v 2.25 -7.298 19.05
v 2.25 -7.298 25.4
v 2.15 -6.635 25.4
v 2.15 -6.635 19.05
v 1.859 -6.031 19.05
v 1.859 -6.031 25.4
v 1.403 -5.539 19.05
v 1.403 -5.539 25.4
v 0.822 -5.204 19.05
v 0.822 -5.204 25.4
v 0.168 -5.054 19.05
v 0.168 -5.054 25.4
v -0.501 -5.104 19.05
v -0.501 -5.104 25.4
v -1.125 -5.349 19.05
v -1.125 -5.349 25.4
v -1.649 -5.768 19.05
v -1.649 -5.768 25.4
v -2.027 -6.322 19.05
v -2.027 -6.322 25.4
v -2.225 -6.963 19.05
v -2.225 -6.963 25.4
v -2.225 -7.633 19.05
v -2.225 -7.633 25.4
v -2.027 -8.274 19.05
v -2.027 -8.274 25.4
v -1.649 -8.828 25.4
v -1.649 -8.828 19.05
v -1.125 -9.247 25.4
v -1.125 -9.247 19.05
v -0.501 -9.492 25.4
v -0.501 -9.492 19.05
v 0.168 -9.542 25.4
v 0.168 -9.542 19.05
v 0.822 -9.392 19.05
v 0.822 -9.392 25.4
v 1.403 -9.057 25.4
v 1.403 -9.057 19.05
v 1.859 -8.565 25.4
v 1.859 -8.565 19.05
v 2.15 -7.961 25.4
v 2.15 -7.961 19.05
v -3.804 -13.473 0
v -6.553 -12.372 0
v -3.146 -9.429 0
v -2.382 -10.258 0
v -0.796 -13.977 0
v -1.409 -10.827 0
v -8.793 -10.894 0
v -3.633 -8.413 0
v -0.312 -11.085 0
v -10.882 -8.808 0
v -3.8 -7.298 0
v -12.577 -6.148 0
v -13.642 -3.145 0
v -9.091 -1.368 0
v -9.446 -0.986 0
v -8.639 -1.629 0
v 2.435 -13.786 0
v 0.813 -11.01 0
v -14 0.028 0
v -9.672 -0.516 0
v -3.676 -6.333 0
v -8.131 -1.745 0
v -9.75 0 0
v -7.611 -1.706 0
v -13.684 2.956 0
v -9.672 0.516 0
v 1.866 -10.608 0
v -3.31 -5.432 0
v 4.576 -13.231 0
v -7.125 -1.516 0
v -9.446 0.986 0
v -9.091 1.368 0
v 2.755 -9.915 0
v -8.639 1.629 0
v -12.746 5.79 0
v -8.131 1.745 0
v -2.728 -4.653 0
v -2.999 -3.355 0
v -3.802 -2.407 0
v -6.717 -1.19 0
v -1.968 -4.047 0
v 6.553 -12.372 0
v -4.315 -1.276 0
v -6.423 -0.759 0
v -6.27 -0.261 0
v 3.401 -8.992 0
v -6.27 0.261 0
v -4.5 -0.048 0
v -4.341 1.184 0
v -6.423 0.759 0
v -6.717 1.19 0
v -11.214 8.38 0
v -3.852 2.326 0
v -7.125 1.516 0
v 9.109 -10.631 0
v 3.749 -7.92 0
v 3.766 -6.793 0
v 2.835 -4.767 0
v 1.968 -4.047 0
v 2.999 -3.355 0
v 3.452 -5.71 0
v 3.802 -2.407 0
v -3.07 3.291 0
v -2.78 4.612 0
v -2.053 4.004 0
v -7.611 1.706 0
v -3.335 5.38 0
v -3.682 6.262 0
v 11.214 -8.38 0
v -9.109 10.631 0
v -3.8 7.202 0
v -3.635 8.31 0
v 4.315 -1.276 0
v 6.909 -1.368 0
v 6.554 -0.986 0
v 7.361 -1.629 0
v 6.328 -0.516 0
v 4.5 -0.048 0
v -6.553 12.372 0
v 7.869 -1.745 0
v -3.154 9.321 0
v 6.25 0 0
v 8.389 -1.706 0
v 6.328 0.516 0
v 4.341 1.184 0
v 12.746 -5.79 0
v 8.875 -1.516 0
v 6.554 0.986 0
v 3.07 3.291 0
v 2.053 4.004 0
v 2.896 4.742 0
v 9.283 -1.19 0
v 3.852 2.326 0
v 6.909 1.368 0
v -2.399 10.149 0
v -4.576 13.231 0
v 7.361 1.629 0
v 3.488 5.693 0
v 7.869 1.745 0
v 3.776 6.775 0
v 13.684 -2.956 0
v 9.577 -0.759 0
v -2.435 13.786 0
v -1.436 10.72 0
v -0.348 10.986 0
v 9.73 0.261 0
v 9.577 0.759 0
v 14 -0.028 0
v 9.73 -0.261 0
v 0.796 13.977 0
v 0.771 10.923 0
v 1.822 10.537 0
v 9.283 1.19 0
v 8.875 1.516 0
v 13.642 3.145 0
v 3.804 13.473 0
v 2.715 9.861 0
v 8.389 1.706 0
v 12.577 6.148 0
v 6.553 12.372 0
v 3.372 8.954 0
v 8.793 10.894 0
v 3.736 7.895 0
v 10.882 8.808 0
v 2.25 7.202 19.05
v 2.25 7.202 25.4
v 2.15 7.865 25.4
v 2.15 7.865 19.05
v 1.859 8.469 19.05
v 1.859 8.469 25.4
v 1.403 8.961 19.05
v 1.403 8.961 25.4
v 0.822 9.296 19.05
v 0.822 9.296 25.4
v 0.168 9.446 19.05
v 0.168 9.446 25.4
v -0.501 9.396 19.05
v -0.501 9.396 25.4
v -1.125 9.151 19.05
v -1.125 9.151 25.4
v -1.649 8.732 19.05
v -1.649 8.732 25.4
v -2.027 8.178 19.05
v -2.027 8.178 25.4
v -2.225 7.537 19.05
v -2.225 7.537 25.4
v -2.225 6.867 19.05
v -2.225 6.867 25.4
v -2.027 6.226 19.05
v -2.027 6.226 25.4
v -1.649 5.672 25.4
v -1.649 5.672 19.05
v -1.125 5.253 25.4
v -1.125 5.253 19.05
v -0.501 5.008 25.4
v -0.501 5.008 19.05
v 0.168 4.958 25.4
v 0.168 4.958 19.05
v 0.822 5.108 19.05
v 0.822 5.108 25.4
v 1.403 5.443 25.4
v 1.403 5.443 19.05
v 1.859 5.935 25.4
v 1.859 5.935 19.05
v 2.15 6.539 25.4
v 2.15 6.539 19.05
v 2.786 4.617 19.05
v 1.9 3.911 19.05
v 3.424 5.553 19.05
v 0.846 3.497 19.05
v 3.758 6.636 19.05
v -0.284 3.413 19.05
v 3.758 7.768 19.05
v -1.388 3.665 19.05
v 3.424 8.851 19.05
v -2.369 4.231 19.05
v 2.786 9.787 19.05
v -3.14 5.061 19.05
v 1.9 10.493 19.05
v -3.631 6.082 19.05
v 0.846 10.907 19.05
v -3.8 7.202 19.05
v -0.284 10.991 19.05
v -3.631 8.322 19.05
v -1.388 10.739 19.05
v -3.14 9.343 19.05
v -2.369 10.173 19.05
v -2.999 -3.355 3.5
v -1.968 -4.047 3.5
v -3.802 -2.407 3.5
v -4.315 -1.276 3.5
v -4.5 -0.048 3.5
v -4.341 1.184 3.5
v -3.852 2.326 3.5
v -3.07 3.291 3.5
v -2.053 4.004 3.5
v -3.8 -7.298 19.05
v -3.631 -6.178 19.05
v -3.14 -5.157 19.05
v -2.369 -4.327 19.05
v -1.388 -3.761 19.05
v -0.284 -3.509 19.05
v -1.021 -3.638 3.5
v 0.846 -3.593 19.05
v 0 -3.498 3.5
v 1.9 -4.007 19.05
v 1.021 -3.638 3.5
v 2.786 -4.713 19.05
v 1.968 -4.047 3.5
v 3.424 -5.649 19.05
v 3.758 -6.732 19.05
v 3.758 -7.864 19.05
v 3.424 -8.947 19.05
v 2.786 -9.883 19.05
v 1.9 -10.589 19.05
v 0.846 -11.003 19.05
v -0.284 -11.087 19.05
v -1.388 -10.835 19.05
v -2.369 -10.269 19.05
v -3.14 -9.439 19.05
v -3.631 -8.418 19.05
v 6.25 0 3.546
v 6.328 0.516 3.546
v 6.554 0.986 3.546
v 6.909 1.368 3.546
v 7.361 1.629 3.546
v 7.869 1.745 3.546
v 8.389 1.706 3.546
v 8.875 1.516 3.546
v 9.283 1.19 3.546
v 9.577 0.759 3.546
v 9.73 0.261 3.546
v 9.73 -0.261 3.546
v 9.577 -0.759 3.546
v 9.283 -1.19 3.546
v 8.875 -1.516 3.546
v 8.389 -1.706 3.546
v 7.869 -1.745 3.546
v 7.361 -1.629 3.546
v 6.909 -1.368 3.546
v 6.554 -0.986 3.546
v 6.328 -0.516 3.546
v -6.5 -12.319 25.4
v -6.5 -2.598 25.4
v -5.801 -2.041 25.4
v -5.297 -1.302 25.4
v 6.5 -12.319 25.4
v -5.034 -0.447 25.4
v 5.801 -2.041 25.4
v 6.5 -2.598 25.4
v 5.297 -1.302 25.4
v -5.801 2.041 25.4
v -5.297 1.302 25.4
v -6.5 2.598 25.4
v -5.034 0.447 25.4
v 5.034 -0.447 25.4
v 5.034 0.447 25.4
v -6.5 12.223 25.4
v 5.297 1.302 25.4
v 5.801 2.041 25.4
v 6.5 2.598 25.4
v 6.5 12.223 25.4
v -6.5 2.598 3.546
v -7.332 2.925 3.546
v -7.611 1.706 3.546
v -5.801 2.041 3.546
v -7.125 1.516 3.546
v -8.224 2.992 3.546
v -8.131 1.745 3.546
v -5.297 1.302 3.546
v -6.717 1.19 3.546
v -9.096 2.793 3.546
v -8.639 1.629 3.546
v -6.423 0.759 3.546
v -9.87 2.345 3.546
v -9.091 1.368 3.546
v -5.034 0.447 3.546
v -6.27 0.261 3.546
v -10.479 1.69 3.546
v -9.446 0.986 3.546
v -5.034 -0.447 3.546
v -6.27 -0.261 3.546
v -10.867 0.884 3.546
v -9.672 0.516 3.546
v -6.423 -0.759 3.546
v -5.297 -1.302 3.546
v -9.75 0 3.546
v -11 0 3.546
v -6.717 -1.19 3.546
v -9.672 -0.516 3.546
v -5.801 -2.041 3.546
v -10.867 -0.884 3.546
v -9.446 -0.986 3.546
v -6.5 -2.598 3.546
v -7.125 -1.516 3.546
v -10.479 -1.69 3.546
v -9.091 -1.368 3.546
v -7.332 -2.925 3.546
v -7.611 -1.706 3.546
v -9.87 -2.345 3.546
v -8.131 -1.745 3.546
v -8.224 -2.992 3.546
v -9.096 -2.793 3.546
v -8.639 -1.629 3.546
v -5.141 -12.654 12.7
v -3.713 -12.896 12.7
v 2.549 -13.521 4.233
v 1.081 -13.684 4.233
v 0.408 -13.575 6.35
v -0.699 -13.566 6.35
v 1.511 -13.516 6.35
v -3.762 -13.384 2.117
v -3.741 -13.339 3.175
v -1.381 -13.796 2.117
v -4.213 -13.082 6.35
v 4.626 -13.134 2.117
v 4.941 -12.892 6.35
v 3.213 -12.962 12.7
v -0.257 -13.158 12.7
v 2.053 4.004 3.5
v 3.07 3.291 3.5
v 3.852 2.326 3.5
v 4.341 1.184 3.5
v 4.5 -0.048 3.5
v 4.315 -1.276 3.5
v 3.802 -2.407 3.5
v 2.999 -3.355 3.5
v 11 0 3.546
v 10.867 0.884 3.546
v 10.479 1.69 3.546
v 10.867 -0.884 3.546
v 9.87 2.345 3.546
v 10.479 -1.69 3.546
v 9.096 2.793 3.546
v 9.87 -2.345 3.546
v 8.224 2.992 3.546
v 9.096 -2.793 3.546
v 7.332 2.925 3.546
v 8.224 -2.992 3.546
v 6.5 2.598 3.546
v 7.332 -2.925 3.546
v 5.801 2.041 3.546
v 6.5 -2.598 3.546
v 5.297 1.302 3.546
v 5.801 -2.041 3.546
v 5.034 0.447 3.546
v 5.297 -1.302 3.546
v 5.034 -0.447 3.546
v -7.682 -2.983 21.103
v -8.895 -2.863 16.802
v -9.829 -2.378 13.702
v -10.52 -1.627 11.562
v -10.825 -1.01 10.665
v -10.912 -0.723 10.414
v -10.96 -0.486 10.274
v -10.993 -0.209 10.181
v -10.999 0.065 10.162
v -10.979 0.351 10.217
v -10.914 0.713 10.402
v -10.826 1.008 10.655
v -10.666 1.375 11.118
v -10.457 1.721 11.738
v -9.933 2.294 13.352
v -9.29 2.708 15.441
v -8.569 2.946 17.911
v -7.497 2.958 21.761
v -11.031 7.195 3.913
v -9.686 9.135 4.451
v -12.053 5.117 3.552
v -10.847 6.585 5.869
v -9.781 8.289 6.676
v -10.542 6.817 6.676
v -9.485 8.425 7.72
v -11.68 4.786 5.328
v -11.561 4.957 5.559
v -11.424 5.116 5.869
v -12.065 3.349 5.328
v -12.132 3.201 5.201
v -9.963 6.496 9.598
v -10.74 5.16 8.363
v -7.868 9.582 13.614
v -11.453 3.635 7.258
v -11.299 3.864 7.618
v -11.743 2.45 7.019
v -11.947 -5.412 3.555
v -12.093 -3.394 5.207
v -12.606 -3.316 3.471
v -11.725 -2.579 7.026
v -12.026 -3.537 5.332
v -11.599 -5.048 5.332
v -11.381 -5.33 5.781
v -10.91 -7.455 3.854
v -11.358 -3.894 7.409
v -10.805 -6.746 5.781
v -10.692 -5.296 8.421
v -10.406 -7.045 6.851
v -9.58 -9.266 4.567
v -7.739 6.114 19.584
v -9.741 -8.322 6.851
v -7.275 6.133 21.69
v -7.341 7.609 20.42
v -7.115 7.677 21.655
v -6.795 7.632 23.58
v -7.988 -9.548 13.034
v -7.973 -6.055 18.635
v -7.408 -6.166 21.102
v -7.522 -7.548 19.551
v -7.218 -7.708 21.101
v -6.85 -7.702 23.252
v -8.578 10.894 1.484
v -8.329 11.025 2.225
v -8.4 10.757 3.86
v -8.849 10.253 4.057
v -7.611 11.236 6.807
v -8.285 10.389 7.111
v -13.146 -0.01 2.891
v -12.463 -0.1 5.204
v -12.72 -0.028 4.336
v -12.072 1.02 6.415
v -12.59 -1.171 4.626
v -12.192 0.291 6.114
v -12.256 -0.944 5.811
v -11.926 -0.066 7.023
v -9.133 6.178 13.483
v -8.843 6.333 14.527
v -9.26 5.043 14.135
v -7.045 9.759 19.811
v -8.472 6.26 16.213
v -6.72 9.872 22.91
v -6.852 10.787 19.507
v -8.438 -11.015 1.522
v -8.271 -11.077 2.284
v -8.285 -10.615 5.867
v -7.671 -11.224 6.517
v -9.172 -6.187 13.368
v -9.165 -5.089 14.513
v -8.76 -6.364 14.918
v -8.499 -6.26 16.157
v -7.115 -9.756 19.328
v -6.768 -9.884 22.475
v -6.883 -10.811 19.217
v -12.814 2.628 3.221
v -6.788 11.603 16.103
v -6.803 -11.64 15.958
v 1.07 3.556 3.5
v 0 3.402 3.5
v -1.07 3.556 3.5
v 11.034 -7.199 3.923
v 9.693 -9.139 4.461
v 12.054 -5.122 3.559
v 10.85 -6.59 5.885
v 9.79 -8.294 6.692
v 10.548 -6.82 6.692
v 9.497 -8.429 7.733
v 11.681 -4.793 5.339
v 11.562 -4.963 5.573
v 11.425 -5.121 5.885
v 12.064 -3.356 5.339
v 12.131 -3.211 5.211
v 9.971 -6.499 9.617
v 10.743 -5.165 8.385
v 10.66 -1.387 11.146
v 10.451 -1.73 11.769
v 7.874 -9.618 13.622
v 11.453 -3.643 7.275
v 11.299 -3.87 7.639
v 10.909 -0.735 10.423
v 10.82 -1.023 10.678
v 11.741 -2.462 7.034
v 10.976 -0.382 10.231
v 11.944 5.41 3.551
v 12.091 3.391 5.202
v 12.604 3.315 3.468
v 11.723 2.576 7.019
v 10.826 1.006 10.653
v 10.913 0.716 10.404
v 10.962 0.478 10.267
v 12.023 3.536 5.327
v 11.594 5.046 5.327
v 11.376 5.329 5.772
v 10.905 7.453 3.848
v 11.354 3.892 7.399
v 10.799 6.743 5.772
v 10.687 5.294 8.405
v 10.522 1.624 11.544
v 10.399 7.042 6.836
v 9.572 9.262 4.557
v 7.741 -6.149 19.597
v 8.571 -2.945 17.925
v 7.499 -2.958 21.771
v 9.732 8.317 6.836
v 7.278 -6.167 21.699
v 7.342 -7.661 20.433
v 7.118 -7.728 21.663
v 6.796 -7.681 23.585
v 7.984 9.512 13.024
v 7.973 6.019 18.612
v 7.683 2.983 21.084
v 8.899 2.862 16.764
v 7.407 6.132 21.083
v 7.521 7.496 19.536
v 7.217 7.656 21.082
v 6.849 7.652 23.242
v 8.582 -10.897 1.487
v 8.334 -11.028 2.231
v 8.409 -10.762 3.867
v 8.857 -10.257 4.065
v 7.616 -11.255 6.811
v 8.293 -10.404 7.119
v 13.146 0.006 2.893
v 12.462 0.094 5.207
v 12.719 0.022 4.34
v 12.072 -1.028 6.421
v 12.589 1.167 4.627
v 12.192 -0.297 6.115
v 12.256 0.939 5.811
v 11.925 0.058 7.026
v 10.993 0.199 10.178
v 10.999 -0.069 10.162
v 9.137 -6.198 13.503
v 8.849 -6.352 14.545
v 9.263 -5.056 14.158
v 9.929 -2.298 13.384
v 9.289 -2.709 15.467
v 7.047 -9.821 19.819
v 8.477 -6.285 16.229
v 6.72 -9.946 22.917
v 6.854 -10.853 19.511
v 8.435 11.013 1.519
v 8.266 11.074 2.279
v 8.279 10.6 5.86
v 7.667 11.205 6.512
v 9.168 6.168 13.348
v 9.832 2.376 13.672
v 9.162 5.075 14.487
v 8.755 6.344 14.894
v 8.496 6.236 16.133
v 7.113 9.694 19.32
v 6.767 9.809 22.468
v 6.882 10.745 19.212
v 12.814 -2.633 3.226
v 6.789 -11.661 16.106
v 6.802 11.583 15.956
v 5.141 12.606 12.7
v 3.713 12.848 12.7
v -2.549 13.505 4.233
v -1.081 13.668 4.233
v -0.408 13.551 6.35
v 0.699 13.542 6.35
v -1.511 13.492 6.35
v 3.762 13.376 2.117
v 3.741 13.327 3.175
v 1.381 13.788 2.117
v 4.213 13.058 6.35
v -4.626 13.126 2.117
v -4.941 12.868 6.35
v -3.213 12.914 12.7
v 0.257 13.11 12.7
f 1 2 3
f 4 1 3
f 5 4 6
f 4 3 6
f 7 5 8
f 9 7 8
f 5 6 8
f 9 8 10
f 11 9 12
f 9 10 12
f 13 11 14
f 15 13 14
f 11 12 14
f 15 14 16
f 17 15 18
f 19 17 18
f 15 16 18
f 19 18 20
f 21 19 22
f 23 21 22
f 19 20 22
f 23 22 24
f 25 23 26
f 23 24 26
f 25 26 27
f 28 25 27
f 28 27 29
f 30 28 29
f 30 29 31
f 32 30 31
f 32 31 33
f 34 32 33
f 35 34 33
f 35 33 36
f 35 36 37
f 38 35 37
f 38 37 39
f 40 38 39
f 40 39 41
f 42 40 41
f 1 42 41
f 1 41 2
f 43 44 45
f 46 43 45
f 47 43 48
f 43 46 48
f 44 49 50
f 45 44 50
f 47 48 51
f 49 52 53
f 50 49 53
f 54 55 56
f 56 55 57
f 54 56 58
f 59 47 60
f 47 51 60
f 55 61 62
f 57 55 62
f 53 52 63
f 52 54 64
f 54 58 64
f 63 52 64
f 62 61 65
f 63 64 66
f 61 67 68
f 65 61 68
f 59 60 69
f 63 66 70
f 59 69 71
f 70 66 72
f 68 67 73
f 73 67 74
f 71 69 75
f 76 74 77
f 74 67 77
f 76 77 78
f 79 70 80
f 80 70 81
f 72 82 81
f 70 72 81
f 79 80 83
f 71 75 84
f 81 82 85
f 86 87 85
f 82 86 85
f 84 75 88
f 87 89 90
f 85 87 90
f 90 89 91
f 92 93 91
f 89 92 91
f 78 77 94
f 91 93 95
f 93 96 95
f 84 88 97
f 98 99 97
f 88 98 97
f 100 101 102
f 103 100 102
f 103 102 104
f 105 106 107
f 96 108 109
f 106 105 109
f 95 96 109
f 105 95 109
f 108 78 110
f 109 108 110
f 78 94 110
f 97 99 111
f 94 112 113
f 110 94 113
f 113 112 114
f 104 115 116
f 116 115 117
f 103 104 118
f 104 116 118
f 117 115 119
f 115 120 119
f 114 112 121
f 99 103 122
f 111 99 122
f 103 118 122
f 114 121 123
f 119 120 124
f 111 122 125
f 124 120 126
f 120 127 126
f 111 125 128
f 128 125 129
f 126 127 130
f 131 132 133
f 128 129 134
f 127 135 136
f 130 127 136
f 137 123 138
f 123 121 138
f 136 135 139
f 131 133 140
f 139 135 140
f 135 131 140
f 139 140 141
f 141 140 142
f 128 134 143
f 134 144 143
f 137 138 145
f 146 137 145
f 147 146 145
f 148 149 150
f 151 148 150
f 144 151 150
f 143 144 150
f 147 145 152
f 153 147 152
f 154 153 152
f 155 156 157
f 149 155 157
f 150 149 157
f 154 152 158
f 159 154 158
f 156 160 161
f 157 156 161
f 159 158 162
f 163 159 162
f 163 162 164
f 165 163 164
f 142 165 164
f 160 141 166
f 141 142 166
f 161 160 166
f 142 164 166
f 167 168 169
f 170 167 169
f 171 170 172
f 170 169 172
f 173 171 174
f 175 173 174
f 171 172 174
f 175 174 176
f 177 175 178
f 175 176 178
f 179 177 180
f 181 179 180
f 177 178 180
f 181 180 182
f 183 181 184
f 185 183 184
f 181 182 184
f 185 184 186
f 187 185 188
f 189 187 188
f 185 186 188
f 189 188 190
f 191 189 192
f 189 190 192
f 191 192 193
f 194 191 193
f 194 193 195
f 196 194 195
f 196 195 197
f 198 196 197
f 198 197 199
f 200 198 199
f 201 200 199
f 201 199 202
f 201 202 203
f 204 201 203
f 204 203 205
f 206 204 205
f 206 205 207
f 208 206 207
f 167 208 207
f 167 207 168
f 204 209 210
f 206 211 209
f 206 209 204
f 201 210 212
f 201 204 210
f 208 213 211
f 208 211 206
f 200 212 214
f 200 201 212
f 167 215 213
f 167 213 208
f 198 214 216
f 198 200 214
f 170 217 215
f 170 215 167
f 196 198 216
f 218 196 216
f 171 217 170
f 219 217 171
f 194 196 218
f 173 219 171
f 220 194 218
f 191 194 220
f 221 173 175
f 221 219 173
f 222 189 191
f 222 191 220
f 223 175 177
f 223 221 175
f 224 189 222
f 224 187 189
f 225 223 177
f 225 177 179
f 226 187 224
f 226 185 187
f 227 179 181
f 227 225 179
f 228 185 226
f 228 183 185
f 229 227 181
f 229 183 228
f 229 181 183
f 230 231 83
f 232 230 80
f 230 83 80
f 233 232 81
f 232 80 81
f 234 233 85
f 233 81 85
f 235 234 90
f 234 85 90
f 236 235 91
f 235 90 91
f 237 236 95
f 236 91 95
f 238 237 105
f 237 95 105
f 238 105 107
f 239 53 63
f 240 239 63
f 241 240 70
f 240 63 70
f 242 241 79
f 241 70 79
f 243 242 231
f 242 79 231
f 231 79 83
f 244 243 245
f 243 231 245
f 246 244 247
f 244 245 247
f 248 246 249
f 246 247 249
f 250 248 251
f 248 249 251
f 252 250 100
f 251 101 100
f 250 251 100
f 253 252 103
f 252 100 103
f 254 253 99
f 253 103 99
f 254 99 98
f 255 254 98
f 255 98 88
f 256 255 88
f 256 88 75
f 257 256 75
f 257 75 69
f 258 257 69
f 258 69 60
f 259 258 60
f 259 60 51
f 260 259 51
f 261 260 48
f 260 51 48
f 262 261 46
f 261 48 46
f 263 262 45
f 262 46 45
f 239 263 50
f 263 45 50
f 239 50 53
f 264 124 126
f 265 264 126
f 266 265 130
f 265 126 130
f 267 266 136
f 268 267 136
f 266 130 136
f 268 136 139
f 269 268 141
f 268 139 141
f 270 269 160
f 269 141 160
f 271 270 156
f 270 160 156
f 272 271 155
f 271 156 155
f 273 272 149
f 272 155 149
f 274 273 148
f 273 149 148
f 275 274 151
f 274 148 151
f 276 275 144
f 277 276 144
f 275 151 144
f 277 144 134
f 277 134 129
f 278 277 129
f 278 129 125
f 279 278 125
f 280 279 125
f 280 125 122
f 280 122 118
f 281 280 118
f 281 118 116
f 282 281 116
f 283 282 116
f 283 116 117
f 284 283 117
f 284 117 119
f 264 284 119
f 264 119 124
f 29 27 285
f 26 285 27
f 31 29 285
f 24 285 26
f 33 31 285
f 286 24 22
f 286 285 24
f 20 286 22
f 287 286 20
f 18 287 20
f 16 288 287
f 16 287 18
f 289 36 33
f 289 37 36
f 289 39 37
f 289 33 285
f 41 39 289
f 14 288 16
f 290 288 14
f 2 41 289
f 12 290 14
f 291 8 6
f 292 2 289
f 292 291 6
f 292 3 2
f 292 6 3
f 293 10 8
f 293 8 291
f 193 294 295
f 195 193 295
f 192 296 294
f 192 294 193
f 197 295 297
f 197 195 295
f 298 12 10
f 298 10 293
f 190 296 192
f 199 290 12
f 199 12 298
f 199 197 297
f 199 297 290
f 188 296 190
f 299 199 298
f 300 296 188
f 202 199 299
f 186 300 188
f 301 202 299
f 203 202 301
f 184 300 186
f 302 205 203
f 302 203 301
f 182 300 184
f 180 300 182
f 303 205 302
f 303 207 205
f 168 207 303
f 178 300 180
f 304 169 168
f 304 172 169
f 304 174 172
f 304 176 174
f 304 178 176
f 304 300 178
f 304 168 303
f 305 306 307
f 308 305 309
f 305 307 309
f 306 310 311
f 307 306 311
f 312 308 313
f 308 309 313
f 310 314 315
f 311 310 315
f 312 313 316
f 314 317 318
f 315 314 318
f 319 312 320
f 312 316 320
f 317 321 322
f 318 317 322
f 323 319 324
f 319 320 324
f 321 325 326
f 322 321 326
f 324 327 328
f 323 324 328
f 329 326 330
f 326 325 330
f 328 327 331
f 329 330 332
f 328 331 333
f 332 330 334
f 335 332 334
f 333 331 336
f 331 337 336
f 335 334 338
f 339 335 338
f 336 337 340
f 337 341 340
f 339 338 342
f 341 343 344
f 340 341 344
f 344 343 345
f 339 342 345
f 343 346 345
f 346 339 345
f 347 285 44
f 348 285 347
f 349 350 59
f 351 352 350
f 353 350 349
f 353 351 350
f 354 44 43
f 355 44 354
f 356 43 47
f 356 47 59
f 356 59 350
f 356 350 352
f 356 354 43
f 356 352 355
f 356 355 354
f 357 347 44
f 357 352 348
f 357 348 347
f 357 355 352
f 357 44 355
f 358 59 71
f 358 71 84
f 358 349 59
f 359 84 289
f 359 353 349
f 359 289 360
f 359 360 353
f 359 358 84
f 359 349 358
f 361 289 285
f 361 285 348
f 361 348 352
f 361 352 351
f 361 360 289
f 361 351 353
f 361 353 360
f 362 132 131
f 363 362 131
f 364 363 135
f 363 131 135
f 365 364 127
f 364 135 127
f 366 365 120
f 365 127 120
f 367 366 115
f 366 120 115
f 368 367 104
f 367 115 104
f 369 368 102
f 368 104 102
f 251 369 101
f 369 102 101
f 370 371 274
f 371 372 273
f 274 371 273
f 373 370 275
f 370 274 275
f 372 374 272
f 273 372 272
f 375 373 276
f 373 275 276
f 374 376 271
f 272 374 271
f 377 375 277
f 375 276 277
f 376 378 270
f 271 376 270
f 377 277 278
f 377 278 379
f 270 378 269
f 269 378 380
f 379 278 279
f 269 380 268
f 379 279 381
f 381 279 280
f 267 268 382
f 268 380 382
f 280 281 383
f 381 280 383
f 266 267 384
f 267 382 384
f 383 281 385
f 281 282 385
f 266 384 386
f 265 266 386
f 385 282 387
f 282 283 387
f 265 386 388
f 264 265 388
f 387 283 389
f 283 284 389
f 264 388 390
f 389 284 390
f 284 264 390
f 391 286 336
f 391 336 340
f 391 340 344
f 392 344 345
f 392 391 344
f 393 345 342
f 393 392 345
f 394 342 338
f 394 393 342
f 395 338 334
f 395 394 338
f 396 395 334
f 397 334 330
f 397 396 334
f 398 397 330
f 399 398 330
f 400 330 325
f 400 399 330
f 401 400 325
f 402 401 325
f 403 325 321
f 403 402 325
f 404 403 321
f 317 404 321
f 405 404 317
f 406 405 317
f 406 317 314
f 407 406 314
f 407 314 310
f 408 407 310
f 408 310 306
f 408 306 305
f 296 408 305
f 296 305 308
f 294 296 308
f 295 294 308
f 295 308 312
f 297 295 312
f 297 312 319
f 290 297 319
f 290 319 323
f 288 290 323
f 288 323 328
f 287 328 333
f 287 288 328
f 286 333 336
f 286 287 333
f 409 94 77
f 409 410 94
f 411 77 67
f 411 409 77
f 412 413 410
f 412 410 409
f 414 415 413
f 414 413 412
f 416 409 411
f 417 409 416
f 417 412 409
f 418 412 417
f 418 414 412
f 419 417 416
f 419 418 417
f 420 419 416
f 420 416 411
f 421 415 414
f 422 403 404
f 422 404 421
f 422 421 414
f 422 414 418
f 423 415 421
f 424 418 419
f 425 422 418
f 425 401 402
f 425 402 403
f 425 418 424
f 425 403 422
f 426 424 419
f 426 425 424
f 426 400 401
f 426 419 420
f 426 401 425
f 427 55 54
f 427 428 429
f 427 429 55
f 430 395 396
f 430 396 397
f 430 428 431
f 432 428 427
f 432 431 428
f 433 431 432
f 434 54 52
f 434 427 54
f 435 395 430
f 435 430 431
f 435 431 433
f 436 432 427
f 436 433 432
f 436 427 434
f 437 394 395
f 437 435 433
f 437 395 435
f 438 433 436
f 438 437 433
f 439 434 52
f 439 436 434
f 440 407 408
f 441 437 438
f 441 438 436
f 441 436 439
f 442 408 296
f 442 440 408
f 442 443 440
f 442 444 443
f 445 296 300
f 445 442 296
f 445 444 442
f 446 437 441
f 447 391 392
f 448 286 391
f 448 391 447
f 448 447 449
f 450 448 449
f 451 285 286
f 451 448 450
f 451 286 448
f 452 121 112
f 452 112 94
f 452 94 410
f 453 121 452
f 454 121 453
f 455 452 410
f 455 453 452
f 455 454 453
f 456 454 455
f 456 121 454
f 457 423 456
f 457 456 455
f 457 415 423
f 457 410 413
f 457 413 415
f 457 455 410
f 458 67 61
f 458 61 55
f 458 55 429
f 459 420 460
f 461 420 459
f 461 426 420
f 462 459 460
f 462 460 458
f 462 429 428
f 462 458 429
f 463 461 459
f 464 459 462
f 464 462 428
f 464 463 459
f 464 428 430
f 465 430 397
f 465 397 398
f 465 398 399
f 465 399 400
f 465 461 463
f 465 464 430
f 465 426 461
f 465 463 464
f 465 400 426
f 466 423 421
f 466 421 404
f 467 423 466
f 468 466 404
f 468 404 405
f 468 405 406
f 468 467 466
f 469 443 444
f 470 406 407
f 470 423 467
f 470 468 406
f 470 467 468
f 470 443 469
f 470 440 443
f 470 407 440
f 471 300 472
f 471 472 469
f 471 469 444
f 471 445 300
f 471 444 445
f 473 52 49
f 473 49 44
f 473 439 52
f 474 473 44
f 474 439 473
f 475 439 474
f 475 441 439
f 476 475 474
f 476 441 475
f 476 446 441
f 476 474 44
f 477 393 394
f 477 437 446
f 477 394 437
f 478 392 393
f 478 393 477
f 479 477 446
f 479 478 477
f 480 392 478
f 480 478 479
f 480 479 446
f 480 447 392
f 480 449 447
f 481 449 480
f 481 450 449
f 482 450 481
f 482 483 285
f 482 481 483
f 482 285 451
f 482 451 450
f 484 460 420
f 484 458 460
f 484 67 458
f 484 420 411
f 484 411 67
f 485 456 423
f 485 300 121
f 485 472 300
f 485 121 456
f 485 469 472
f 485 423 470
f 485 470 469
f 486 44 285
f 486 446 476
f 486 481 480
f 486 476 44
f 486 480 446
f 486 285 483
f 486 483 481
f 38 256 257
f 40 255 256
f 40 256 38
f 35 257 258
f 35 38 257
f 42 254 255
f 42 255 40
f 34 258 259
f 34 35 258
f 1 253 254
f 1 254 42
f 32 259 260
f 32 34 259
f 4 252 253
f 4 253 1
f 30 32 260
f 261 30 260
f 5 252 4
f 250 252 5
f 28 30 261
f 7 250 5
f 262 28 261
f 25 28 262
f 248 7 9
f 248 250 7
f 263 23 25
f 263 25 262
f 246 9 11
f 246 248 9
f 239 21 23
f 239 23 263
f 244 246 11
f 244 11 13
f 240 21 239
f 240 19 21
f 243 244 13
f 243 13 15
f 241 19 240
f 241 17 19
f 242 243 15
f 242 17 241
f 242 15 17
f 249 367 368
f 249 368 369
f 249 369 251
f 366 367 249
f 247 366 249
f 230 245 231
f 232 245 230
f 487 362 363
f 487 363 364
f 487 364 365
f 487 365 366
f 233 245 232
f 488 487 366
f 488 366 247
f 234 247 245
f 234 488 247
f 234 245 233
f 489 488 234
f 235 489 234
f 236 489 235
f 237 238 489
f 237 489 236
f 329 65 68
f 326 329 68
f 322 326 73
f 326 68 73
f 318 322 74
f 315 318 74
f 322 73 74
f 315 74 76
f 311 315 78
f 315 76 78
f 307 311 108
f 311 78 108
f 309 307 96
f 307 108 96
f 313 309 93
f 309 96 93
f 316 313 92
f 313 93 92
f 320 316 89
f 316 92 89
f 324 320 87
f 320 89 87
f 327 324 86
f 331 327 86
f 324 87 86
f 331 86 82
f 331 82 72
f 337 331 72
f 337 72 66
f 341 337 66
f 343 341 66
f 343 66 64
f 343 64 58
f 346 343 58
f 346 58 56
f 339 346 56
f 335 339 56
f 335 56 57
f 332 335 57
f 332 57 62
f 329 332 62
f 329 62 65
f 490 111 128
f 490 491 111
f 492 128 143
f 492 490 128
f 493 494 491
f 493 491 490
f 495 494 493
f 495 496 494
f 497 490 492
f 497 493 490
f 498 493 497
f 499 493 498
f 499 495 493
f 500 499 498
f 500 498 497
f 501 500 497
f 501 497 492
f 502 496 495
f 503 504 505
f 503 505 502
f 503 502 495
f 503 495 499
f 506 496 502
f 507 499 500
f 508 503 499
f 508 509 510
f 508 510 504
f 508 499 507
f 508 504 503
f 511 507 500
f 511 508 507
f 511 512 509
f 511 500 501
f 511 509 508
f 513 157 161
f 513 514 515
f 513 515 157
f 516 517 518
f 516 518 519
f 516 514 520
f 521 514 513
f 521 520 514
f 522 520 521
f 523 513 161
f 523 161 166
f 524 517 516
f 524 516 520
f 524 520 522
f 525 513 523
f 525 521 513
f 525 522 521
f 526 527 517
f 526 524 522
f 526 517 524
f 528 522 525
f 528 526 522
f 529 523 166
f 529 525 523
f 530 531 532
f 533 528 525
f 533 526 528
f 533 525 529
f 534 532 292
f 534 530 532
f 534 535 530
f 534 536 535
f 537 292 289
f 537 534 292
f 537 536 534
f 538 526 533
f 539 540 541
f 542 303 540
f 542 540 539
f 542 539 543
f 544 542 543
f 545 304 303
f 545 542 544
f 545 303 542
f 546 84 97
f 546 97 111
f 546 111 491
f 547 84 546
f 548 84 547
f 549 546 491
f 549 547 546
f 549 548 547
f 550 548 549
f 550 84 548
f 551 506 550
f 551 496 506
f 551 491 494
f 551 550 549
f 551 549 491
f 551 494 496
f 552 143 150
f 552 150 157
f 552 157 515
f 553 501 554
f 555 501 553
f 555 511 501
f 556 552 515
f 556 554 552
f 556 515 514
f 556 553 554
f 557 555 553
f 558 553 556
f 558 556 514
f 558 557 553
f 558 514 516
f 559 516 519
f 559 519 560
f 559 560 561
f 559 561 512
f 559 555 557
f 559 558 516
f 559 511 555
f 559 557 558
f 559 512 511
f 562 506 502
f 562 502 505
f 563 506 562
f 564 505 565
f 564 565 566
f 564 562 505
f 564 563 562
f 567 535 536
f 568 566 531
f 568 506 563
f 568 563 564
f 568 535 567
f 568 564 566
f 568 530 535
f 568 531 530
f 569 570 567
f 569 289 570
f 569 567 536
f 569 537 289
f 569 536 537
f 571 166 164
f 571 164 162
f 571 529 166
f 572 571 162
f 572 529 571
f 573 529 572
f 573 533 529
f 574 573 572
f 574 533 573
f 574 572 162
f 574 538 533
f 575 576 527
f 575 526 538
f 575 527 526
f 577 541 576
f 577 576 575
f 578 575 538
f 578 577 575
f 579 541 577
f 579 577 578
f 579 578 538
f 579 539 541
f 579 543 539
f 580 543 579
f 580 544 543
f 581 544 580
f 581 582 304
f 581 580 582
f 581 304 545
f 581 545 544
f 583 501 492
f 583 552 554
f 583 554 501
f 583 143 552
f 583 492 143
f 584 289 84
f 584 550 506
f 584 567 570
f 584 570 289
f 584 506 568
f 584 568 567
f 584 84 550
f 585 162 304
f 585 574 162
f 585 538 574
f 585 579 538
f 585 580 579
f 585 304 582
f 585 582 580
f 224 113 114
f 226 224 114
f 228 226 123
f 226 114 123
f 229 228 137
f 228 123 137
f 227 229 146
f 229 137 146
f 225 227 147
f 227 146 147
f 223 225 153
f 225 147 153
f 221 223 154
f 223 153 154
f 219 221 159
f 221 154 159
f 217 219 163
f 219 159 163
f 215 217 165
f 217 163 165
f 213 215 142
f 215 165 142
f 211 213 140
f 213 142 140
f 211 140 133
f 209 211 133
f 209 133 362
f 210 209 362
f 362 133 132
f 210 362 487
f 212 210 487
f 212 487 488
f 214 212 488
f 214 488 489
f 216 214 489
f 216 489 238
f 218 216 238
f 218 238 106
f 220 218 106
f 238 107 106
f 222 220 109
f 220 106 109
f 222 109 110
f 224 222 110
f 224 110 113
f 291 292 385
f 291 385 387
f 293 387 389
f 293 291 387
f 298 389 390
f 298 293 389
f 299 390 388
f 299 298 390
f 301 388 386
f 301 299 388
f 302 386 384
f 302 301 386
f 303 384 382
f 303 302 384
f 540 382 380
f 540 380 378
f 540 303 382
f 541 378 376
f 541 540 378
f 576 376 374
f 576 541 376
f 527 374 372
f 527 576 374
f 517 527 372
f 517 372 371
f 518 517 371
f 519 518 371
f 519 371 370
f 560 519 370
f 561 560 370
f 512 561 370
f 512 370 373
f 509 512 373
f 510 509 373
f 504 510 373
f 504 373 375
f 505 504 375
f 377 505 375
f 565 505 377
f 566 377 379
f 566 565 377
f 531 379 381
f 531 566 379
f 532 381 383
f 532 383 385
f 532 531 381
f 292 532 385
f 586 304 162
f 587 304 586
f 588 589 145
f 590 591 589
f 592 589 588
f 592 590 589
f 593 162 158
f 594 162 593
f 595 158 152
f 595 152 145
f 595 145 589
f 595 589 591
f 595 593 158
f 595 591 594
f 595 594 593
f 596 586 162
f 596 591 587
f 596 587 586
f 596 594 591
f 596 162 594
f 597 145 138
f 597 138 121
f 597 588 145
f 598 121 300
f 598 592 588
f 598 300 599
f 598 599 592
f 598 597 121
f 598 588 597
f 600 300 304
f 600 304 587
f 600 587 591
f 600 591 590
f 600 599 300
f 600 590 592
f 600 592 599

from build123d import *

# Parameters (mm, degrees)
CUT_EXTRUDE1_DEPTH      = 0.254
CUT_EXTRUDE1_DEPTH_BACK = 29.404968727
CUT_EXTRUDE1_START      = -3.8
SKETCH5_R               = 2.999999969
SKETCH5_R_2             = 3
SKETCH6_R               = 1.75
CUT_EXTRUDE2_DEPTH      = 33.204968727
SKETCH7_R               = 2.25
SKETCH7_R_2             = 2.249999945
CUT_EXTRUDE3_DEPTH      = 33.204968727
SKETCH8_R               = 3.8
CUT_EXTRUDE4_DEPTH      = 19.05
SKETCH9_R               = 4.5
CUT_EXTRUDE5_DEPTH      = 3.5


with BuildPart() as part:
    # Loft1: read off the stored shape, not the designer's step
    # Loft1: loft between two sections, ruled curve by curve
    loft1_from = [
        Edge.make_bspline([(6.55325358, -12.371534566, 0), (7.464294458, -11.888952404, 0), (8.384566214, -11.272101526, 0), (10.134710604, -9.728764793, 0), (10.963640628, -8.800972824, 0), (12.385245025, -6.653137916, 0), (12.975801321, -5.432751611, 0), (13.784177023, -2.807609973, 0), (14, -1.404493643, 0), (14, 1.404493643, 0), (13.784177023, 2.807609973, 0), (12.975801321, 5.432751611, 0), (12.385245025, 6.653137916, 0), (10.963640628, 8.800972824, 0), (10.134710604, 9.728764793, 0), (8.384566214, 11.272101526, 0), (7.464294458, 11.888952404, 0), (6.55325358, 12.371534566, 0)], [0, 0, 0, 0, 0.125, 0.125, 0.25, 0.25, 0.375, 0.375, 0.5, 0.5, 0.625, 0.625, 0.75, 0.75, 0.875, 0.875, 1, 1, 1, 1], 3),
        Edge.make_bspline([(6.55325358, 12.371534566, 0), (5.588089256, 12.882786143, 0), (4.533369794, 13.294840206, 0), (2.318771517, 13.853790689, 0), (1.159653791, 14, 0), (-1.159653791, 14, 0), (-2.318771517, 13.853790689, 0), (-4.533369794, 13.294840206, 0), (-5.588089256, 12.882786143, 0), (-6.55325358, 12.371534566, 0)], [0, 0, 0, 0, 0.25, 0.25, 0.5, 0.5, 0.75, 0.75, 1, 1, 1, 1], 3),
        Edge.make_bspline([(-6.55325358, -12.371534566, 0), (-5.588089256, -12.882786143, 0), (-4.533369794, -13.294840206, 0), (-2.318771517, -13.853790689, 0), (-1.159653791, -14, 0), (1.159653791, -14, 0), (2.318771517, -13.853790689, 0), (4.533369794, -13.294840206, 0), (5.588089256, -12.882786143, 0), (6.55325358, -12.371534566, 0)], [0, 0, 0, 0, 0.25, 0.25, 0.5, 0.5, 0.75, 0.75, 1, 1, 1, 1], 3),
        Edge.make_bspline([(-6.55325358, 12.371534566, 0), (-7.464294458, 11.888952404, 0), (-8.384566214, 11.272101526, 0), (-10.134710604, 9.728764793, 0), (-10.963640628, 8.800972824, 0), (-12.385245025, 6.653137916, 0), (-12.975801321, 5.432751611, 0), (-13.784177023, 2.807609973, 0), (-14, 1.404493643, 0), (-14, -1.404493643, 0), (-13.784177023, -2.807609973, 0), (-12.975801321, -5.432751611, 0), (-12.385245025, -6.653137916, 0), (-10.963640628, -8.800972824, 0), (-10.134710604, -9.728764793, 0), (-8.384566214, -11.272101526, 0), (-7.464294458, -11.888952404, 0), (-6.55325358, -12.371534566, 0)], [0, 0, 0, 0, 0.125, 0.125, 0.25, 0.25, 0.375, 0.375, 0.5, 0.5, 0.625, 0.625, 0.75, 0.75, 0.875, 0.875, 1, 1, 1, 1], 3),
    ]
    loft1_to = [
        Edge.make_bspline([(6.5, -12.319, 25.4), (6.5, -11.296416667, 25.4), (6.5, -10.273833333, 25.4), (6.5, -8.228666667, 25.4), (6.5, -7.206083333, 25.4), (6.5, -5.160916667, 25.4), (6.5, -4.138333333, 25.4), (6.5, -2.093166667, 25.4), (6.5, -1.070583333, 25.4), (6.5, 0.974583333, 25.4), (6.5, 1.997166667, 25.4), (6.5, 4.042333333, 25.4), (6.5, 5.064916667, 25.4), (6.5, 7.110083333, 25.4), (6.5, 8.132666667, 25.4), (6.5, 10.177833333, 25.4), (6.5, 11.200416667, 25.4), (6.5, 12.223, 25.4)], [0, 0, 0, 0, 0.125, 0.125, 0.25, 0.25, 0.375, 0.375, 0.5, 0.5, 0.625, 0.625, 0.75, 0.75, 0.875, 0.875, 1, 1, 1, 1], 3),
        Edge.make_bspline([(6.5, 12.223, 25.4), (5.416666667, 12.223, 25.4), (4.333333333, 12.223, 25.4), (2.166666667, 12.223, 25.4), (1.083333333, 12.223, 25.4), (-1.083333333, 12.223, 25.4), (-2.166666667, 12.223, 25.4), (-4.333333333, 12.223, 25.4), (-5.416666667, 12.223, 25.4), (-6.5, 12.223, 25.4)], [0, 0, 0, 0, 0.25, 0.25, 0.5, 0.5, 0.75, 0.75, 1, 1, 1, 1], 3),
        Edge.make_bspline([(-6.5, -12.319, 25.4), (-5.416666667, -12.319, 25.4), (-4.333333333, -12.319, 25.4), (-2.166666667, -12.319, 25.4), (-1.083333333, -12.319, 25.4), (1.083333333, -12.319, 25.4), (2.166666667, -12.319, 25.4), (4.333333333, -12.319, 25.4), (5.416666667, -12.319, 25.4), (6.5, -12.319, 25.4)], [0, 0, 0, 0, 0.25, 0.25, 0.5, 0.5, 0.75, 0.75, 1, 1, 1, 1], 3),
        Edge.make_bspline([(-6.5, 12.223, 25.4), (-6.5, 11.200416667, 25.4), (-6.5, 10.177833333, 25.4), (-6.5, 8.132666667, 25.4), (-6.5, 7.110083333, 25.4), (-6.5, 5.064916667, 25.4), (-6.5, 4.042333333, 25.4), (-6.5, 1.997166667, 25.4), (-6.5, 0.974583333, 25.4), (-6.5, -1.070583333, 25.4), (-6.5, -2.093166667, 25.4), (-6.5, -4.138333333, 25.4), (-6.5, -5.160916667, 25.4), (-6.5, -7.206083333, 25.4), (-6.5, -8.228666667, 25.4), (-6.5, -10.273833333, 25.4), (-6.5, -11.296416667, 25.4), (-6.5, -12.319, 25.4)], [0, 0, 0, 0, 0.125, 0.125, 0.25, 0.25, 0.375, 0.375, 0.5, 0.5, 0.625, 0.625, 0.75, 0.75, 0.875, 0.875, 1, 1, 1, 1], 3),
    ]
    loft1 = Solid(Shell([*[Face.make_surface_from_curves(loft1_from[k], loft1_to[k]) for k in range(4)], Face(Wire(loft1_from)), Face(Wire(loft1_to))]))
    add(loft1)

    # Sketch5 → Cut-Extrude1 (cut, two sides: drawn at the far end of the back side and taken through both)
    with BuildSketch(Plane(origin=(0, 0, 0), x_dir=(-1, 0, 0), z_dir=(0, 0, -1)).offset(CUT_EXTRUDE1_START - CUT_EXTRUDE1_DEPTH_BACK)):
        with Locations(Location((-8, 0, 0), (0, 0, 300.000000342))):
            Circle(SKETCH5_R)
        with Locations(Location((8, 0, 0), (0, 0, 240))):
            Circle(SKETCH5_R_2)
    extrude(amount=CUT_EXTRUDE1_DEPTH + CUT_EXTRUDE1_DEPTH_BACK, mode=Mode.SUBTRACT)

    # Sketch6 → Cut-Extrude2 (cut, through all)
    with BuildSketch(Plane(origin=(0, 0, 0), x_dir=(-1, 0, 0), z_dir=(0, 0, -1))):
        with Locations((-8, 0)):
            Circle(SKETCH6_R)
        with Locations((8, 0)):
            Circle(SKETCH6_R)
    extrude(amount=-CUT_EXTRUDE2_DEPTH, mode=Mode.SUBTRACT)

    # Sketch7 → Cut-Extrude3 (cut, through all)
    with BuildSketch(Plane.XY.offset(25.4)):
        with Locations((0, -7.298)):
            Circle(SKETCH7_R)
        with Locations((0, 7.202)):
            Circle(SKETCH7_R_2)
    extrude(amount=-CUT_EXTRUDE3_DEPTH, mode=Mode.SUBTRACT)

    # Sketch8 → Cut-Extrude4 (cut)
    with BuildSketch(Plane(origin=(0, 0, 0), x_dir=(-1, 0, 0), z_dir=(0, 0, -1))):
        with Locations((0, -7.298)):
            Circle(SKETCH8_R)
        with Locations((0, 7.202)):
            Circle(SKETCH8_R)
    extrude(amount=-CUT_EXTRUDE4_DEPTH, mode=Mode.SUBTRACT)

    # Sketch9 → Cut-Extrude5 (cut)
    with BuildSketch(Plane(origin=(0, 0, 0), x_dir=(-1, 0, 0), z_dir=(0, 0, -1))):
        Circle(SKETCH9_R)
    extrude(amount=-CUT_EXTRUDE5_DEPTH, mode=Mode.SUBTRACT)


solid = part.part
